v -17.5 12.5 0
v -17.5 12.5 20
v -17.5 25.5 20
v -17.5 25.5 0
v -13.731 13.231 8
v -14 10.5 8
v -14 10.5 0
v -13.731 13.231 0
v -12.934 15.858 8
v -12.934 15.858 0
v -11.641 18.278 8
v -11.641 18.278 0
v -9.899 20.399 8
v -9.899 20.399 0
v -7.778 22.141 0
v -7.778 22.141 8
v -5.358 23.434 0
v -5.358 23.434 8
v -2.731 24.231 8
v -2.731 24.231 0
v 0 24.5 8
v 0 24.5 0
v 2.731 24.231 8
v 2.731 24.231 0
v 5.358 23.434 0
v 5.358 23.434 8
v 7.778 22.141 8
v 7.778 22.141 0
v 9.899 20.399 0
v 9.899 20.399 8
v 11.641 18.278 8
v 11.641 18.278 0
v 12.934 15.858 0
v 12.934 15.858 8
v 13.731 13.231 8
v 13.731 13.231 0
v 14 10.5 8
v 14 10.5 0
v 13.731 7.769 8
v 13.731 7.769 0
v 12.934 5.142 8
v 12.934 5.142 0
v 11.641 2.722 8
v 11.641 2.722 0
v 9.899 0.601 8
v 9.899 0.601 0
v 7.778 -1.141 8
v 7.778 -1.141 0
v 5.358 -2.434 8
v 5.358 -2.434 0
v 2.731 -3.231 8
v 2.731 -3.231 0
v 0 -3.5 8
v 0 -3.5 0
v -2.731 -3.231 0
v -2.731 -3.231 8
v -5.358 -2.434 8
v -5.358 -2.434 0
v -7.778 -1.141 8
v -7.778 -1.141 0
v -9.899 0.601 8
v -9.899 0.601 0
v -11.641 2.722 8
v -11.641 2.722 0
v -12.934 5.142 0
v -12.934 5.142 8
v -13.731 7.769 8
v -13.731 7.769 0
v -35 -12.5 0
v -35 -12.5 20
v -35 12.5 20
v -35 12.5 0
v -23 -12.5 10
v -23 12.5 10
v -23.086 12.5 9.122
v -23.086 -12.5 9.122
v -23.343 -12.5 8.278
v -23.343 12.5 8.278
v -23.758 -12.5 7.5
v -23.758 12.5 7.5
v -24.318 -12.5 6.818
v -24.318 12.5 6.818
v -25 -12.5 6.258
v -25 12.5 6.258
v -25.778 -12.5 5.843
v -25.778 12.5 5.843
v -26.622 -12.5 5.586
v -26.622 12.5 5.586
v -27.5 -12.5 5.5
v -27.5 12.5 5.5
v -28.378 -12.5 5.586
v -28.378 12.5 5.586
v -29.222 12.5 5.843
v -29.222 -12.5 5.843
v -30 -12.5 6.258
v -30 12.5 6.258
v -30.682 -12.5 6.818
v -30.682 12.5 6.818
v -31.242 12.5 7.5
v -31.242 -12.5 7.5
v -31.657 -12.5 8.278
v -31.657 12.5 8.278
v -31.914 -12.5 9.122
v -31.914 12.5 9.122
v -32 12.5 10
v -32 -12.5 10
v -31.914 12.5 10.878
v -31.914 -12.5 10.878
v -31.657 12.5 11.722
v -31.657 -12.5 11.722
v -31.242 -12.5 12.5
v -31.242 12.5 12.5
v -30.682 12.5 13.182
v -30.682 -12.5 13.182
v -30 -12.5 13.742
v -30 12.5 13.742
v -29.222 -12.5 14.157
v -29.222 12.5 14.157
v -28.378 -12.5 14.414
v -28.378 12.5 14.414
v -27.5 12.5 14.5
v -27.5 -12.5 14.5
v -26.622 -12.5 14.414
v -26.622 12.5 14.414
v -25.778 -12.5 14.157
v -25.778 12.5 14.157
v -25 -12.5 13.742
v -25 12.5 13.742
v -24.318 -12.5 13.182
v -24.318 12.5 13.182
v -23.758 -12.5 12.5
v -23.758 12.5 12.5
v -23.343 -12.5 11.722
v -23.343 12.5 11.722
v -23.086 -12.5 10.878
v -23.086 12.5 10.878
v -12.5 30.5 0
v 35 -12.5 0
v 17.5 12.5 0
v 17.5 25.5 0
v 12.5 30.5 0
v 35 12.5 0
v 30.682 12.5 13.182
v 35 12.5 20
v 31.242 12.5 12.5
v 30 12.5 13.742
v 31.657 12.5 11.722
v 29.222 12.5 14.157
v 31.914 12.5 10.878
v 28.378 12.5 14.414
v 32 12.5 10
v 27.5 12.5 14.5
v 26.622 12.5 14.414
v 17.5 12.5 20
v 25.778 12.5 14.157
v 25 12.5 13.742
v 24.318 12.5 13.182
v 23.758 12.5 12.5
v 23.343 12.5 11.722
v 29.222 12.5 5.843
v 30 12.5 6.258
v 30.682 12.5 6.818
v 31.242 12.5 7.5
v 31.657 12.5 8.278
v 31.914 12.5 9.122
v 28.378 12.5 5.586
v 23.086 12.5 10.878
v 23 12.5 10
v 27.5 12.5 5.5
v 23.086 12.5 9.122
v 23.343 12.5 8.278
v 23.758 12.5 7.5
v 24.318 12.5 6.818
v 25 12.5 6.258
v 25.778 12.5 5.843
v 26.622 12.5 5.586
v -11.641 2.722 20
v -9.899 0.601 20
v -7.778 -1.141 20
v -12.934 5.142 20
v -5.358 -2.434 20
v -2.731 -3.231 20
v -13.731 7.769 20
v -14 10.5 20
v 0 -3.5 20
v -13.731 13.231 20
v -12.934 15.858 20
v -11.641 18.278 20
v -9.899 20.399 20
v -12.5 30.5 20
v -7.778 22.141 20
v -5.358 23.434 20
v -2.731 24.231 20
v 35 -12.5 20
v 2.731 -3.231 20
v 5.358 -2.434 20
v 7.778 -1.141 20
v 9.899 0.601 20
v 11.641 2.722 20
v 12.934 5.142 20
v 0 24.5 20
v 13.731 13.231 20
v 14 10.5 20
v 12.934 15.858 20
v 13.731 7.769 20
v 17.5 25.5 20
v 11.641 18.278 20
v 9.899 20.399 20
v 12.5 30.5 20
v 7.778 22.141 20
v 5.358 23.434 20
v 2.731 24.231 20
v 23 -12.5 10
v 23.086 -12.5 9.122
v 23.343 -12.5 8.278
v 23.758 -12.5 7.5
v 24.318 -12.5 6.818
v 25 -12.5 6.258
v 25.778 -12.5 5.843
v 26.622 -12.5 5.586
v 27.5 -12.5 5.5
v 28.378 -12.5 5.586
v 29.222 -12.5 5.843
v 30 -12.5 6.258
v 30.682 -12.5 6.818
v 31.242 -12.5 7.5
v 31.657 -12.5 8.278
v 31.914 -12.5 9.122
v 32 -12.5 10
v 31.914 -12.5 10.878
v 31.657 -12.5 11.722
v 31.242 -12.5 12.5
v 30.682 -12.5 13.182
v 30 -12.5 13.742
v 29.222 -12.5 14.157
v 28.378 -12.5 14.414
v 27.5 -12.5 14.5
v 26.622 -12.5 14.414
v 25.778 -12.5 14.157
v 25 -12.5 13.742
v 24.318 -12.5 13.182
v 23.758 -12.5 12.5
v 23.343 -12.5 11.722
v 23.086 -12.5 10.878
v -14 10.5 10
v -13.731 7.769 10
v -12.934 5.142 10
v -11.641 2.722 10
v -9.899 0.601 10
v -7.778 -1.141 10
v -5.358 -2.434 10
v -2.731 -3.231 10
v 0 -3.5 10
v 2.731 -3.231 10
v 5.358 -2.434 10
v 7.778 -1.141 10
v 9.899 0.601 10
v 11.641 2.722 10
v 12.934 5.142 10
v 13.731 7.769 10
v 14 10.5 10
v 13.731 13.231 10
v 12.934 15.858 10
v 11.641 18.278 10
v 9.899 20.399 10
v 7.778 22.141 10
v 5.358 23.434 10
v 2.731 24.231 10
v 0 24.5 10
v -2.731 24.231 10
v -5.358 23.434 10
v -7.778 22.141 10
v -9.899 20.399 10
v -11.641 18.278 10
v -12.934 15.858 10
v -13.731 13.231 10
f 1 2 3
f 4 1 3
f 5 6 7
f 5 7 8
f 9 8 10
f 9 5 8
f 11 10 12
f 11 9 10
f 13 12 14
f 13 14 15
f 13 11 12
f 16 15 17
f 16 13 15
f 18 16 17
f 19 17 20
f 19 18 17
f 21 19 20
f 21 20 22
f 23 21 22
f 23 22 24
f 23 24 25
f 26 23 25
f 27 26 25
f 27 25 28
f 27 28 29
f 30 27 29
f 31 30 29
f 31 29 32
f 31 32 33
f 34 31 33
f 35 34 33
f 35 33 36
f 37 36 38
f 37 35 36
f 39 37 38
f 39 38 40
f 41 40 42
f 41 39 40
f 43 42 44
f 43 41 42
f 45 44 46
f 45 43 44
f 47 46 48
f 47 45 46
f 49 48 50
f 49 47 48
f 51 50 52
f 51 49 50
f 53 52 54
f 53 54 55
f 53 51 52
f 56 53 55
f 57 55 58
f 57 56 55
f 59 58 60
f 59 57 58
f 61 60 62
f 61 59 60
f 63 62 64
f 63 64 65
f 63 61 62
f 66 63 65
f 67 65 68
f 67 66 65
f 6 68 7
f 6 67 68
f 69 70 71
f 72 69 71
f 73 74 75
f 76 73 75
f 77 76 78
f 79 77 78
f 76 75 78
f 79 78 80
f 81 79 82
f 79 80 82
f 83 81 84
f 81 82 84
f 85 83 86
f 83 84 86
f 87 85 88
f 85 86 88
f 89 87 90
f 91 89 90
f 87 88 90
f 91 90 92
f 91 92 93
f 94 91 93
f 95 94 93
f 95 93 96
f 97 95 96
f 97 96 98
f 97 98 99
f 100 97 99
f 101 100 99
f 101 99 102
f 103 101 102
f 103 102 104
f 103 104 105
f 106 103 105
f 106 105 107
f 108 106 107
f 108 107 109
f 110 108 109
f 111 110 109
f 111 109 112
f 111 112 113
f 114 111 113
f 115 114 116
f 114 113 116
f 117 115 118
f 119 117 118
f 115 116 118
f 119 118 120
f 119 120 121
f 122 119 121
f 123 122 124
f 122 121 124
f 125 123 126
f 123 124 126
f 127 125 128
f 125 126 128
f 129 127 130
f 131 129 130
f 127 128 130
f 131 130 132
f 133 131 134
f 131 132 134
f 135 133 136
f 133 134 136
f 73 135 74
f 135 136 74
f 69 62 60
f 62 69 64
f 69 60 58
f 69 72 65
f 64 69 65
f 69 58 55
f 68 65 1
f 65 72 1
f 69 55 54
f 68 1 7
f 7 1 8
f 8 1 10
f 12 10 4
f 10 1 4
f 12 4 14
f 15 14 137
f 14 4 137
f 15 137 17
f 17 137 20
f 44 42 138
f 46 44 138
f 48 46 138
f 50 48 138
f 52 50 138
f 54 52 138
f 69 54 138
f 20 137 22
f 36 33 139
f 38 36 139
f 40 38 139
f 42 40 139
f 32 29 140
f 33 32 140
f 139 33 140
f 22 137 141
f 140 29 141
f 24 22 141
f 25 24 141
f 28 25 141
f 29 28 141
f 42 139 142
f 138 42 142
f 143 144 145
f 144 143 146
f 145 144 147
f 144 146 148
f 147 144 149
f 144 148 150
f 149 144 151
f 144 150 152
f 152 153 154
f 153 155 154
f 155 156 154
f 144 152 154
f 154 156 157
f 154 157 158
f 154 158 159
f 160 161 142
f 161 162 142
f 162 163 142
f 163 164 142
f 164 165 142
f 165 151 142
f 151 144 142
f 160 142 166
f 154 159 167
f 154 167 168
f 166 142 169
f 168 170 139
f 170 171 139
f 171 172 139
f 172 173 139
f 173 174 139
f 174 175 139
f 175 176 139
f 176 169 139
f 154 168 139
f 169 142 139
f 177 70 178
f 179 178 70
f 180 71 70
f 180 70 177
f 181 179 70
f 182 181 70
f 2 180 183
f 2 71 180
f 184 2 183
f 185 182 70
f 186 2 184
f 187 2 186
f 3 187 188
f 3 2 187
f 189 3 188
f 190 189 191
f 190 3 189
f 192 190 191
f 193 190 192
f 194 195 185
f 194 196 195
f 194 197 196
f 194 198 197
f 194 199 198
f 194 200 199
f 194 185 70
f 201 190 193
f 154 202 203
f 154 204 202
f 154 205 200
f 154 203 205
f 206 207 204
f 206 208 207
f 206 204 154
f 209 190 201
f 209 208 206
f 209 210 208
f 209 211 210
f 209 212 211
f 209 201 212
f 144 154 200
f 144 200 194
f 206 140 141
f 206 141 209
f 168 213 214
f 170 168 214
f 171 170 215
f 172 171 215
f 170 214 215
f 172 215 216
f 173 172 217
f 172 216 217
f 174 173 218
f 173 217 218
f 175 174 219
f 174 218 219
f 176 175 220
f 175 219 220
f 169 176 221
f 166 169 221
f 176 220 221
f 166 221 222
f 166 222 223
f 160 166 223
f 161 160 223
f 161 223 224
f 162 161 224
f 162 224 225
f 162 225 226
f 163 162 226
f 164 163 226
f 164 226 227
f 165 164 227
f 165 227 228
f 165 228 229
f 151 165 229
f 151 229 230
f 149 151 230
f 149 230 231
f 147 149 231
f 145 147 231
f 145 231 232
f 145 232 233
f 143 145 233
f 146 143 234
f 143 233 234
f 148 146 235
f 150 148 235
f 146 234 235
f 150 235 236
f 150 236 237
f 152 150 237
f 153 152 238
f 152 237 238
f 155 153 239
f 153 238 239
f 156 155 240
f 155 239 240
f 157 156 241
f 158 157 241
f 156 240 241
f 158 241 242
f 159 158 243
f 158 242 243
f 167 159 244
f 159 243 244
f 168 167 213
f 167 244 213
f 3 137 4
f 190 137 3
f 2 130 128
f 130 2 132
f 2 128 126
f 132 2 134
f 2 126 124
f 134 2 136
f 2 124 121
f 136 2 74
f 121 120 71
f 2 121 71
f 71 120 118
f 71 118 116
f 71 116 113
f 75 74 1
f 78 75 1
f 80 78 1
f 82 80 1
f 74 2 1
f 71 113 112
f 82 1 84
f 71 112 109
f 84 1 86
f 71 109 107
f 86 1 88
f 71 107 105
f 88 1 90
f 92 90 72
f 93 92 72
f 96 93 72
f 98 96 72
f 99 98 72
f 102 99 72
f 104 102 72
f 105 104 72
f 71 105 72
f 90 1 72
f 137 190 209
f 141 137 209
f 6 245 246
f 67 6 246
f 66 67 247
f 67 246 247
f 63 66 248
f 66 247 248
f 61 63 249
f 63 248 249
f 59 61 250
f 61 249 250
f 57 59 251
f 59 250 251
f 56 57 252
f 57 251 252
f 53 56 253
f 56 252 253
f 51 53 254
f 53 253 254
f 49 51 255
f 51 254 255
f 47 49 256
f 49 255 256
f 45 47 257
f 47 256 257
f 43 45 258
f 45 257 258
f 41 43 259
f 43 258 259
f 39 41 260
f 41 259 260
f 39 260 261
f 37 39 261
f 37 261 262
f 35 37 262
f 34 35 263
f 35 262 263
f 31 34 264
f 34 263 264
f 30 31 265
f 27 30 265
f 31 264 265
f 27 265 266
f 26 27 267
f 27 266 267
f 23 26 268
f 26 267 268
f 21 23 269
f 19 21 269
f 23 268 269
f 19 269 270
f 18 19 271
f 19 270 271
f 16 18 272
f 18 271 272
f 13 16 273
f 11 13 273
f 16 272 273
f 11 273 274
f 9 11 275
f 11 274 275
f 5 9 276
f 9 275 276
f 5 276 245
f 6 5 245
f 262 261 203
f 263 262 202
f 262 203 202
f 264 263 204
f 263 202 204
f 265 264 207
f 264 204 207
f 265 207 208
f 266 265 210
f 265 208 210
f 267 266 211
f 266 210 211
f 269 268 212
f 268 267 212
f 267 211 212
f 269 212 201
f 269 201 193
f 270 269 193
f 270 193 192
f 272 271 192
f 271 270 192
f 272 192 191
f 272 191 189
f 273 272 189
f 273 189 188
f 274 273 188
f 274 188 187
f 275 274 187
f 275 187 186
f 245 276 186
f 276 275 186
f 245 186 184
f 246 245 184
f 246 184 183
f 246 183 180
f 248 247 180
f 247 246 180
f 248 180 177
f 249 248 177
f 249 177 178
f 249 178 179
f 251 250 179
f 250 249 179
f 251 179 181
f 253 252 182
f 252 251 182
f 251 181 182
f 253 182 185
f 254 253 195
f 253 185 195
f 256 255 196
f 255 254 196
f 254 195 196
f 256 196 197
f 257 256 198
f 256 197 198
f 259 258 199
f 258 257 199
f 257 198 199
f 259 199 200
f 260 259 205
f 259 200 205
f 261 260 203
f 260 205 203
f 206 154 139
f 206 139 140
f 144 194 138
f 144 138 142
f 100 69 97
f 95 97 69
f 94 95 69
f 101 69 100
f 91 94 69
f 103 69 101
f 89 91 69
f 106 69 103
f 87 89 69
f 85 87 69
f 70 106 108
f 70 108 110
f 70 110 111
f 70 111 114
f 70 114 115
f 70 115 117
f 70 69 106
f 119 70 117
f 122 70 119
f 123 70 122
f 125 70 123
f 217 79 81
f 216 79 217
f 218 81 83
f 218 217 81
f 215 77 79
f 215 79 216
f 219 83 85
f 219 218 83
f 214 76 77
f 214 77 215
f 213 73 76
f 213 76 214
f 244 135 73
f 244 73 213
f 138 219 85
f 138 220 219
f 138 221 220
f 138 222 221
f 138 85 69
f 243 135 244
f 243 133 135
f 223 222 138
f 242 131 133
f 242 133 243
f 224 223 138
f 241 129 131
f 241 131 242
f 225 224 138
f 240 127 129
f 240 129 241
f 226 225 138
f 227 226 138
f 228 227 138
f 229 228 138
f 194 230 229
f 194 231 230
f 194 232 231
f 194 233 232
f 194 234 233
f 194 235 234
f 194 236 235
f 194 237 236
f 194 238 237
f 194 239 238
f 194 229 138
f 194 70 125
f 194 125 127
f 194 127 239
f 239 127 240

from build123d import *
from build123d.topology import SkipClean

# Parameters (mm, degrees)
SKETCH_1_W                    = 70
SKETCH_1_H                    = 43
EXTRUDE_1_DEPTH               = 20
SKETCH_2_W                    = 17.5
SKETCH_2_H                    = 18
CUT_EXTRUDE_1_DEPTH           = 51.549480709
SKETCH_3_W                    = 17.5
SKETCH_3_H                    = 18
CUT_EXTRUDE_2_DEPTH           = 51.549480709
HOLE_WIZARD_9_0_9_1_D         = 9
HOLE_WIZARD_9_0_9_2_D         = 9
HOLE_WIZARD_9_0_9_2_DEPTH     = 43
HOLE_WIZARD_M24_1_D           = 25
HOLE_WIZARD_M24_1_CBORE_D     = 32
HOLE_WIZARD_M24_1_CBORE_DEPTH = 12
CHAMFER_1_SIZE                = 5
EXTRUDE_START                 = 12
SKETCH_15_R                   = 16
SKETCH_15_R_2                 = 14
EXTRUDE_3_DEPTH               = 12
CUT_EXTRUDE_START             = -10
SKETCH_16_R                   = 14
CUT_EXTRUDE_7_DEPTH           = 10


with BuildPart() as part:
    # 草图1 → 凸台-拉伸1 (new body)
    with BuildSketch(Plane.XY.offset(20)):
        with Locations((0, 9)):
            Rectangle(SKETCH_1_W, SKETCH_1_H)
    extrude(amount=-EXTRUDE_1_DEPTH)

    # 草图2 → 切除-拉伸1 (cut, through all)
    with BuildSketch(Plane(origin=(0, 0, 0), x_dir=(-1, 0, 0), z_dir=(0, 0, -1))):
        with Locations((26.25, 21.5)):
            Rectangle(SKETCH_2_W, SKETCH_2_H)
    extrude(amount=-CUT_EXTRUDE_1_DEPTH, mode=Mode.SUBTRACT)

    # 草图3 → 切除-拉伸2 (cut, through all)
    with BuildSketch(Plane(origin=(0, 0, 0), x_dir=(-1, 0, 0), z_dir=(0, 0, -1))):
        with Locations((-26.25, 21.5)):
            Rectangle(SKETCH_3_W, SKETCH_3_H)
    extrude(amount=-CUT_EXTRUDE_2_DEPTH, mode=Mode.SUBTRACT)

    # Ø9.0 (9) 直径孔1 (through all)
    with Locations(Plane(origin=(0, 12.5, 0), x_dir=(1, 0, 0), z_dir=(0, 1, 0))):
        with Locations((27.5, -10)):
            Hole(HOLE_WIZARD_9_0_9_1_D / 2)

    # Ø9.0 (9) 直径孔2
    with Locations(Plane(origin=(0, -12.5, 0), x_dir=(-1, 0, 0), z_dir=(0, -1, 0))):
        with Locations((27.5, -10)):
            Hole(HOLE_WIZARD_9_0_9_2_D / 2, depth=HOLE_WIZARD_9_0_9_2_DEPTH)

    # M24 六角头螺栓的柱形沉头孔1 (through all)
    with Locations(Plane.XY.offset(20)):
        with Locations((0, 10.5)):
            CounterBoreHole(HOLE_WIZARD_M24_1_D / 2, HOLE_WIZARD_M24_1_CBORE_D / 2, HOLE_WIZARD_M24_1_CBORE_DEPTH)

    # 倒角1
    chamfer_1_edges = [part.edges().sort_by_distance(p)[0] for p in [
        (-17.5, 30.5, 10),
        (17.5, 30.5, 10),
    ]]
    chamfer(chamfer_1_edges, length=CHAMFER_1_SIZE)

    # 草图15 → 凸台-拉伸3 (add)
    with BuildSketch(Plane.XY.offset(8).offset(EXTRUDE_START)):
        with Locations((0, 10.5)):
            Circle(SKETCH_15_R)
        with Locations((0, 10.5)):
            Circle(SKETCH_15_R_2, mode=Mode.SUBTRACT)
    extrude(amount=-EXTRUDE_3_DEPTH)

    # 草图16 → 切除-拉伸7 (cut)
    with SkipClean():  # the faces are left unmerged after this step: merging them gives an invalid solid
        with BuildSketch(Plane(origin=(0, 0, 0), x_dir=(-1, 0, 0), z_dir=(0, 0, -1)).offset(CUT_EXTRUDE_START)):
            with Locations((0, 10.5)):
                Circle(SKETCH_16_R)
        extrude(amount=CUT_EXTRUDE_7_DEPTH, mode=Mode.SUBTRACT)


solid = part.part
